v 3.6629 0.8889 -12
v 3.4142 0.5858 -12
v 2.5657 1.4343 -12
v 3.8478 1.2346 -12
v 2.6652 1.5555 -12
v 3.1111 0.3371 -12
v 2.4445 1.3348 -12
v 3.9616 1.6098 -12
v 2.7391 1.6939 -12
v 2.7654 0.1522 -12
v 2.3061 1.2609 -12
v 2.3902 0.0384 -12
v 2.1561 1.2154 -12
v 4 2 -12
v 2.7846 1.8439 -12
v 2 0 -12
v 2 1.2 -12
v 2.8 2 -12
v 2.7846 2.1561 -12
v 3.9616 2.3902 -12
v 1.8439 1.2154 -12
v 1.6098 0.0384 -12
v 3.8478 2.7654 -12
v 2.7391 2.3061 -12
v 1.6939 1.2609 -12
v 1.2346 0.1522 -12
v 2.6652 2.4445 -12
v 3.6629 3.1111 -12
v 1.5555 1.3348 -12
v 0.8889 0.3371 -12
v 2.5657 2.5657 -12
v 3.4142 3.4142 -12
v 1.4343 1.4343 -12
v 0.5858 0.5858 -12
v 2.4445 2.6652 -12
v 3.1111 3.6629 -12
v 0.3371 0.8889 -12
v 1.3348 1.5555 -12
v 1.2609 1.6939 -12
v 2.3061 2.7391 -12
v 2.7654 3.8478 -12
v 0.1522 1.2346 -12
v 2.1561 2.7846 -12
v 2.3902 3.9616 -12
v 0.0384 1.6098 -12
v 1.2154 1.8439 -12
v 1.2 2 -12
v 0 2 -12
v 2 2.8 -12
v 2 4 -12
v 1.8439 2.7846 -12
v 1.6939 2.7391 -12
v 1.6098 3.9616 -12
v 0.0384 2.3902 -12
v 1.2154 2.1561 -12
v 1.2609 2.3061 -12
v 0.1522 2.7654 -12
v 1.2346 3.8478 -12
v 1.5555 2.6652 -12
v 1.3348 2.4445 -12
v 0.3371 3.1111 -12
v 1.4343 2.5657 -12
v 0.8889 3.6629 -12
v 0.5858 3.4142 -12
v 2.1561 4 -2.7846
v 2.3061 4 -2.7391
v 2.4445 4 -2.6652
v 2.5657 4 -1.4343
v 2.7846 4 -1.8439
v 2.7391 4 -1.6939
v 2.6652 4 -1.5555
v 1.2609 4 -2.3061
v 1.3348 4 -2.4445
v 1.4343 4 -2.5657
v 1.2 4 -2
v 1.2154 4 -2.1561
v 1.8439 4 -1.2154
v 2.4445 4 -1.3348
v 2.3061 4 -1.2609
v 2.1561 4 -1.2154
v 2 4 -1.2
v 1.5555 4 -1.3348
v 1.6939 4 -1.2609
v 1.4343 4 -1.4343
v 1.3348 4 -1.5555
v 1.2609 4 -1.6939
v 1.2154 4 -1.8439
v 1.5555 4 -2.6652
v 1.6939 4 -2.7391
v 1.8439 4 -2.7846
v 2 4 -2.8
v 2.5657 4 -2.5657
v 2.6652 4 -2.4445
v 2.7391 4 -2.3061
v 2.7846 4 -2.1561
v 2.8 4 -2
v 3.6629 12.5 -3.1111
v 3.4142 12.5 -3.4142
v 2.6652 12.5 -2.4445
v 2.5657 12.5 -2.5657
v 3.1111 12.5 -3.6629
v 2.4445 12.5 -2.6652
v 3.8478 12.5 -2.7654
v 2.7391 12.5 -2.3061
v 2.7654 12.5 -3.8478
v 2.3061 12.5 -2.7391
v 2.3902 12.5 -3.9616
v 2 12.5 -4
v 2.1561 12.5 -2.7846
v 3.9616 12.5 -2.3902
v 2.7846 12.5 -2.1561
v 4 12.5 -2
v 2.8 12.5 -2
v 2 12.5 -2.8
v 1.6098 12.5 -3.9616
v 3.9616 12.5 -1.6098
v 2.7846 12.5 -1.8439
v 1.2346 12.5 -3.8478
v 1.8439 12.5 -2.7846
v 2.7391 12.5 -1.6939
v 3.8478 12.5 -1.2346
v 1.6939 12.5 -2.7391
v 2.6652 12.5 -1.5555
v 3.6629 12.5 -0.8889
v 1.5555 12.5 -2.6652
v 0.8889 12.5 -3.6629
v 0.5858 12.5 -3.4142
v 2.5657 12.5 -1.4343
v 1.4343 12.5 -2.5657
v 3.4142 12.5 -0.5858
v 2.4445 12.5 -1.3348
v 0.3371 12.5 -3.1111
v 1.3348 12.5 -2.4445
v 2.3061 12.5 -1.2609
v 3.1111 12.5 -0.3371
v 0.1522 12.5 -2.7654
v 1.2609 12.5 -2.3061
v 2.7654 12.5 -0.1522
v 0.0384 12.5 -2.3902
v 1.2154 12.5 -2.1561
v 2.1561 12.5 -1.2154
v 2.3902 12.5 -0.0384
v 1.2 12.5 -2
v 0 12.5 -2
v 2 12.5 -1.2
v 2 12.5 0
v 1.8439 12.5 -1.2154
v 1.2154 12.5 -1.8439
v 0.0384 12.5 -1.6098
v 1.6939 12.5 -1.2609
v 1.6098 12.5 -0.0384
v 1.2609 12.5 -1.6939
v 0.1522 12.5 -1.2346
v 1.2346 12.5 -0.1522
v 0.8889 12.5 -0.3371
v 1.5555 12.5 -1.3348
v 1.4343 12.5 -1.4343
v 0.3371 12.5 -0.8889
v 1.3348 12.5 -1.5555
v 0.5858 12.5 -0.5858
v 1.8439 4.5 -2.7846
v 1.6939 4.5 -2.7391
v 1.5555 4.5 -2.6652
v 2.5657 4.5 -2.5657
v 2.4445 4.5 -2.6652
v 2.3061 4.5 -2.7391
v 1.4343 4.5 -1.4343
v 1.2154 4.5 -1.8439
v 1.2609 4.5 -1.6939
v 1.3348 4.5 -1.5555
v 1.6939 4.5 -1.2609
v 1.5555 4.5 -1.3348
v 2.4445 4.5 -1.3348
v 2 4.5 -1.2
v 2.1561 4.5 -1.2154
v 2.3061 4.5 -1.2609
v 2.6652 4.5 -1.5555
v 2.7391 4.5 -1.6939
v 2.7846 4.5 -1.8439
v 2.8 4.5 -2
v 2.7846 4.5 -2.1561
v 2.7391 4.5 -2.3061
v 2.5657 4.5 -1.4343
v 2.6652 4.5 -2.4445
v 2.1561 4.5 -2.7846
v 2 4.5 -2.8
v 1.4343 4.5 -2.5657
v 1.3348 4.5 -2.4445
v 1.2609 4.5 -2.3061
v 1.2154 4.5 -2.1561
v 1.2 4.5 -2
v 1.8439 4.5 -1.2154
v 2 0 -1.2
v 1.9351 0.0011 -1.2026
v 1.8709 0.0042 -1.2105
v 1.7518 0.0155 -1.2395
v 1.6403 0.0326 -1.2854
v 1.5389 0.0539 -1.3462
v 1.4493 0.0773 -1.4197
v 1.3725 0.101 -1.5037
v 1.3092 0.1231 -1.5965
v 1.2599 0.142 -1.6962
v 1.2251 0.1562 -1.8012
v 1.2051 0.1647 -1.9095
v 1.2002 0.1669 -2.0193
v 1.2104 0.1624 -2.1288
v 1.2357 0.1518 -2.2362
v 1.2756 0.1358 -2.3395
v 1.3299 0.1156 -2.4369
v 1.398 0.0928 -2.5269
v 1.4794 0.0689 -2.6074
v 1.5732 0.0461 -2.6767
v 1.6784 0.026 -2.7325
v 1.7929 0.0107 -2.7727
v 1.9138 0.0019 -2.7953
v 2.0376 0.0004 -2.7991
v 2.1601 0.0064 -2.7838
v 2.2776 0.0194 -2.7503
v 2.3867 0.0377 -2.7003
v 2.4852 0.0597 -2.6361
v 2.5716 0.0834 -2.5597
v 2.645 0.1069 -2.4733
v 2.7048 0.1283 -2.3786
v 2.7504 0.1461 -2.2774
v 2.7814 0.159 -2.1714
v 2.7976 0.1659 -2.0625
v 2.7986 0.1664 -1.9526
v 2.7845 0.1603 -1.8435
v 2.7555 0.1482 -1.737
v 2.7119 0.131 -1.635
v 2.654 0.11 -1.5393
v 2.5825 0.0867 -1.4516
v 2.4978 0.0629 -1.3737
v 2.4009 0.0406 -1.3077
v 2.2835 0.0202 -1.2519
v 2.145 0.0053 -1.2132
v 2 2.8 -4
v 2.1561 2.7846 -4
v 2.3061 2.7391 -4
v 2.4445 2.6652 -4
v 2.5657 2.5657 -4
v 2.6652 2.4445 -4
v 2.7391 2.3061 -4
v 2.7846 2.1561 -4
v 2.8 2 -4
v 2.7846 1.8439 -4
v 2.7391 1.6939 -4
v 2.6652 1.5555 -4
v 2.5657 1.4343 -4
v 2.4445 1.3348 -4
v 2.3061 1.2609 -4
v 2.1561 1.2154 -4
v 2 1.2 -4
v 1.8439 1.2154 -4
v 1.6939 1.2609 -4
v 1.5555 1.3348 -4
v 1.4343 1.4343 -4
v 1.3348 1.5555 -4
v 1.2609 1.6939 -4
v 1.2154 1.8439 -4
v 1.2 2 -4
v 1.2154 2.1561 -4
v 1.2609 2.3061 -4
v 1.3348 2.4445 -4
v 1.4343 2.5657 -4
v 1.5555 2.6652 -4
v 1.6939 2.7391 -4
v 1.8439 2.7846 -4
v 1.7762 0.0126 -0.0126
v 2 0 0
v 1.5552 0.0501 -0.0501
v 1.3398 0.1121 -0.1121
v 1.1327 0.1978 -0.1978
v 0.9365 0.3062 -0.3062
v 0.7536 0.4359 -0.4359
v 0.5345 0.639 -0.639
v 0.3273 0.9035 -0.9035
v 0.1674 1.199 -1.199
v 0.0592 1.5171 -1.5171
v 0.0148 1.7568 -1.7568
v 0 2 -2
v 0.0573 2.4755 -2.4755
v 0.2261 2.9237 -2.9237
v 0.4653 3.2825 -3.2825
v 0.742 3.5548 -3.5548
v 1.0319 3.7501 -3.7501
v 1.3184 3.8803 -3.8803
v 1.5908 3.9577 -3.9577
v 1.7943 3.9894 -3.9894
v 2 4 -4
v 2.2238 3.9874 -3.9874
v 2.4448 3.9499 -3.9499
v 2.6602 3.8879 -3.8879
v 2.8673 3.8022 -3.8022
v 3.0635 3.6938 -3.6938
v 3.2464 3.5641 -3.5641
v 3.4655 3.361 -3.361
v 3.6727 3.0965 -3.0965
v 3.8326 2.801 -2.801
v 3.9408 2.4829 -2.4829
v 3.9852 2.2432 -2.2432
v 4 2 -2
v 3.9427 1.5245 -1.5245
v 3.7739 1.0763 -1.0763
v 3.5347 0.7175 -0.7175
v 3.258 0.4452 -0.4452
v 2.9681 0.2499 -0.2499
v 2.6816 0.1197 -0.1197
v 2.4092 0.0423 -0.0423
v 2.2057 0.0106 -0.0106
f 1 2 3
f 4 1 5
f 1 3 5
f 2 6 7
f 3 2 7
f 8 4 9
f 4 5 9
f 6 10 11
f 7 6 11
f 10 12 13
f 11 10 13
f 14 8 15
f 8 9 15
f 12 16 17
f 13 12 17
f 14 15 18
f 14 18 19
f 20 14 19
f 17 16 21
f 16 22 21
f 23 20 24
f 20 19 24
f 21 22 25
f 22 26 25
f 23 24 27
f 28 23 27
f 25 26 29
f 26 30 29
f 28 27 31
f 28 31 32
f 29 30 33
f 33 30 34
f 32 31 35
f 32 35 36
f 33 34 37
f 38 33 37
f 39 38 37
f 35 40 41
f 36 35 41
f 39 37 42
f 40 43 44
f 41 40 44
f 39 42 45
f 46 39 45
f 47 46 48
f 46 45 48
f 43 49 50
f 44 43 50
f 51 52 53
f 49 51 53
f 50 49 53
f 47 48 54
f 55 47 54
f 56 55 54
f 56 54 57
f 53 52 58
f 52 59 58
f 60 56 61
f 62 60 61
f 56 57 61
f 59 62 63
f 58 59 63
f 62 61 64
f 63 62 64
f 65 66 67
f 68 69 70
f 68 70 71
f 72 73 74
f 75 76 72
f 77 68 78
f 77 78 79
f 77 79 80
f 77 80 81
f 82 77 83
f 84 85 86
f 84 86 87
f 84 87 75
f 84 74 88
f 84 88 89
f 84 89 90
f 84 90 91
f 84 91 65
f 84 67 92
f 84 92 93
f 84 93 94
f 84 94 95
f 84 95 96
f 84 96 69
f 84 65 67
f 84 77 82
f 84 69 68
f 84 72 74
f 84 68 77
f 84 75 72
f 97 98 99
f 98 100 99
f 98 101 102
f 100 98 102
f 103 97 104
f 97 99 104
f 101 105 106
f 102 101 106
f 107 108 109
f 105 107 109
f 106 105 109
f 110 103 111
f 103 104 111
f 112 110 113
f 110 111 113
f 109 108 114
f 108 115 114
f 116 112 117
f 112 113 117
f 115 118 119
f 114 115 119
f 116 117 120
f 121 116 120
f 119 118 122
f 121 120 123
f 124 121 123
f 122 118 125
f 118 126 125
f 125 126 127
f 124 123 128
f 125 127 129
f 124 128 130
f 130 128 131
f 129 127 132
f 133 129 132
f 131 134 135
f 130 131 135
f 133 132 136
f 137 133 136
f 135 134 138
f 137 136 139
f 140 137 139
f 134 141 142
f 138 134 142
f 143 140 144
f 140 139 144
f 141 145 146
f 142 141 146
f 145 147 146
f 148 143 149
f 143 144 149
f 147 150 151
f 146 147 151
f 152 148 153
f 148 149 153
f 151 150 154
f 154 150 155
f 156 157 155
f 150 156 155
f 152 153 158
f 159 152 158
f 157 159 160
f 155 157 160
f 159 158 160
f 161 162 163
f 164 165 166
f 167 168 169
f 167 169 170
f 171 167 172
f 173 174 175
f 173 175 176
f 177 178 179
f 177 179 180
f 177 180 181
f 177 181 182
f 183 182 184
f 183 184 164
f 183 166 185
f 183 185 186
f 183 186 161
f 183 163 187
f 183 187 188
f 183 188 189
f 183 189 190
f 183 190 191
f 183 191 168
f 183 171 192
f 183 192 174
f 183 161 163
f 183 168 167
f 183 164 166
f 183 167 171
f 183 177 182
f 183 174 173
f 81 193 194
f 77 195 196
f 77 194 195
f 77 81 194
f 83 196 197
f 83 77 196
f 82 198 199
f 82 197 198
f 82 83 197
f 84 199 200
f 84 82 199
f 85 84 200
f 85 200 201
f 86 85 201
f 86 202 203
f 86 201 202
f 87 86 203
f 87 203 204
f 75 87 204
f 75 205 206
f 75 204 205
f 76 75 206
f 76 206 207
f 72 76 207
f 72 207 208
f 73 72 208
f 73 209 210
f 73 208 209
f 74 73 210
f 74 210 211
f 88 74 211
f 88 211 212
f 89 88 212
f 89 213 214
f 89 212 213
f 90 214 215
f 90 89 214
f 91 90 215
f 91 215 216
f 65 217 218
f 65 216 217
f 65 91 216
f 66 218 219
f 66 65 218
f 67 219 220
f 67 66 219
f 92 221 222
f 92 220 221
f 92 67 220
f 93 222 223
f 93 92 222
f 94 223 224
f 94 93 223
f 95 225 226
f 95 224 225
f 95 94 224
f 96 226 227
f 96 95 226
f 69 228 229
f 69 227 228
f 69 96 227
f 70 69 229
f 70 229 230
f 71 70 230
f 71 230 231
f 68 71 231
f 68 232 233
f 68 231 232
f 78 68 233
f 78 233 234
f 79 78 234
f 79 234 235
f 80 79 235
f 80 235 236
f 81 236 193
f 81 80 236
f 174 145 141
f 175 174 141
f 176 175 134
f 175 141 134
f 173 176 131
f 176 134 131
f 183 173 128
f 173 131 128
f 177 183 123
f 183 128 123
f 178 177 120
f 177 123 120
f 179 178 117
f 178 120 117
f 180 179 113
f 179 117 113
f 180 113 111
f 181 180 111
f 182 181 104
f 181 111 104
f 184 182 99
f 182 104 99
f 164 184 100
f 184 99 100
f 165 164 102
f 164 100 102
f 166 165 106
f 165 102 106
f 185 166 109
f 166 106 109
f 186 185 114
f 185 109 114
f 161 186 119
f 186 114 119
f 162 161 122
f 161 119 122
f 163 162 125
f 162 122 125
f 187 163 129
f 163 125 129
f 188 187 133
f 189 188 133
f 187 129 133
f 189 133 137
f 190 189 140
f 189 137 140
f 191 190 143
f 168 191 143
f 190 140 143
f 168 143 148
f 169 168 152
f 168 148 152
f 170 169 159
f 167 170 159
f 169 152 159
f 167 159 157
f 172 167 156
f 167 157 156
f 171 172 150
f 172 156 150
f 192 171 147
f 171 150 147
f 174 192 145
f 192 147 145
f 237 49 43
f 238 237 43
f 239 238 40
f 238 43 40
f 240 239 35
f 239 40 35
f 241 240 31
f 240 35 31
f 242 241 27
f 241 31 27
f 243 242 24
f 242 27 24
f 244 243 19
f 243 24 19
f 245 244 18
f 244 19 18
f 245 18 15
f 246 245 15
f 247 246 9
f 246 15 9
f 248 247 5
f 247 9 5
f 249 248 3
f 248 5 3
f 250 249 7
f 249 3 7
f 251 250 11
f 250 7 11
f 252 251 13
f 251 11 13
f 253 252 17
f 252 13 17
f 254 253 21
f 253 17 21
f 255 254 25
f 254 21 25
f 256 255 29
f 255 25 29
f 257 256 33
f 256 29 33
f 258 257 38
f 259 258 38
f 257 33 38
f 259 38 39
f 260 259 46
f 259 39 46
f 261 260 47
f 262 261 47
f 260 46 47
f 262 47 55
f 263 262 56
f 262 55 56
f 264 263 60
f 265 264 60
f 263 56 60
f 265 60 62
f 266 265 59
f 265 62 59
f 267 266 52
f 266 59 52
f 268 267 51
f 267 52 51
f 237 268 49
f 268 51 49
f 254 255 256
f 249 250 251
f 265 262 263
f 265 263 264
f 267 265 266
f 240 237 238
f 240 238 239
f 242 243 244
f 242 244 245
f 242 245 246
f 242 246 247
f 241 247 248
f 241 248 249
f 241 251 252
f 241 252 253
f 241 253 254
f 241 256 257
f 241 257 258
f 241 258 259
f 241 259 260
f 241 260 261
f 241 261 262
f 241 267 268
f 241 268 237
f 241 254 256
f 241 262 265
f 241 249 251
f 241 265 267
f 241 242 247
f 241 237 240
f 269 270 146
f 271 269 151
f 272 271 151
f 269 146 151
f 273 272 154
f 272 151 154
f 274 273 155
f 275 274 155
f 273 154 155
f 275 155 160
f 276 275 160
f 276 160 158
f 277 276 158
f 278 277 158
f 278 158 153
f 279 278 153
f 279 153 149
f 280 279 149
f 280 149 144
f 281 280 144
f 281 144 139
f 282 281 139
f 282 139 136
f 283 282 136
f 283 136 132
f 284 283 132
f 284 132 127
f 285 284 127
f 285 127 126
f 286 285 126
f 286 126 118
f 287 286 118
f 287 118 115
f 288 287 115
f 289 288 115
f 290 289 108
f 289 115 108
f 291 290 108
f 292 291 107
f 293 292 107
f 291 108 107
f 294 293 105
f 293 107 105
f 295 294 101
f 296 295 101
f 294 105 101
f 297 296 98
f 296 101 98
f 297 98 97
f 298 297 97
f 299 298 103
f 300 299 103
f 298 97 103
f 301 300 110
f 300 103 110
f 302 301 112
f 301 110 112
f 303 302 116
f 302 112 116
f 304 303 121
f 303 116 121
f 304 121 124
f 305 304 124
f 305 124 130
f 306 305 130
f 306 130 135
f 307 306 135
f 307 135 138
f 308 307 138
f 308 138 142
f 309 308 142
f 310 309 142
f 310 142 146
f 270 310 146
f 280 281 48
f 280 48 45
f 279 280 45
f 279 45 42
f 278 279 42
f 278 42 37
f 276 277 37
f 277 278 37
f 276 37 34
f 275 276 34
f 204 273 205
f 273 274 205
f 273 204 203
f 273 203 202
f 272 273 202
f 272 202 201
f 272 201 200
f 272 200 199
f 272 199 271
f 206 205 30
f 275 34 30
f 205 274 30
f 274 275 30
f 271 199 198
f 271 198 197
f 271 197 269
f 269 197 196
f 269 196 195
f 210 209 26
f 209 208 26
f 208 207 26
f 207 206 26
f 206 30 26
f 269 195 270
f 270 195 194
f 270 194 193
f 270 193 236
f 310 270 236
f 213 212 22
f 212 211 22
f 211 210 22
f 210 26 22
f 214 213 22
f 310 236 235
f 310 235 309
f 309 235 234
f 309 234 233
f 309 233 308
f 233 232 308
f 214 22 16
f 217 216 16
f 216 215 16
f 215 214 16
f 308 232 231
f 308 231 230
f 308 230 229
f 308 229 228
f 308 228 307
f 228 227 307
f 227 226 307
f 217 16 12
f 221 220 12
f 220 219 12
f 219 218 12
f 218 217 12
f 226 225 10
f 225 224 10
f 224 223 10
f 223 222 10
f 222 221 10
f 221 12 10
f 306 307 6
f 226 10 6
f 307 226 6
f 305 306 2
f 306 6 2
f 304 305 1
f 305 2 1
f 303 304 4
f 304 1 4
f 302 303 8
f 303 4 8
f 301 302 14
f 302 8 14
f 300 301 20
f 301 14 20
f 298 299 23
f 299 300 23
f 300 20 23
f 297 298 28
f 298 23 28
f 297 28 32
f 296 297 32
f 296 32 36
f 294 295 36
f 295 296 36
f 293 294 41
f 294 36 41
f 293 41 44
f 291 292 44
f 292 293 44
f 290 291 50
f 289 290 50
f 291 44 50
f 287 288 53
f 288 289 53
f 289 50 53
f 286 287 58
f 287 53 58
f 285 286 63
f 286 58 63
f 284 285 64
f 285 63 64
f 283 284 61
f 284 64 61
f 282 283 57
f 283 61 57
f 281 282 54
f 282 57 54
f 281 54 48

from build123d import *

# Parameters (mm, degrees)
ESQUISSE4_W             = 8
ESQUISSE4_H             = 4
BOSS_EXTRU_2_DEPTH      = 4
ESQUISSE10_R            = 0.8
ENL_V_MAT_EXTRU_3_DEPTH = 8
ENL_V_START             = -4
ESQUISSE11_R            = 0.8
ENL_V_MAT_EXTRU_4_DEPTH = 4
ESQUISSE7_R             = 0.8
ENL_V_MAT_EXTRU_2_DEPTH = 8
CONG_4_R                = 2


with BuildPart() as part:
    # Esquisse4 → Boss.-Extru.2 (new body)
    with BuildSketch(Plane(origin=(0, 0, 0), x_dir=(0, 0, -1), z_dir=(1, 0, 0))):
        with Locations((8, 2)):
            Rectangle(ESQUISSE4_W, ESQUISSE4_H)
        Polygon((4, 0), (4, 4), (4, 12.5), (0, 12.5), (0, 0), align=None)
    extrude(amount=BOSS_EXTRU_2_DEPTH)

    # Esquisse10 → Enlèv. mat.-Extru.3 (cut)
    with BuildSketch(Plane(origin=(0, 12.5, 0), x_dir=(1, 0, 0), z_dir=(0, 1, 0))):
        with Locations(Location((2, 2, 0), (0, 0, 270))):
            Circle(ESQUISSE10_R)
    extrude(amount=-ENL_V_MAT_EXTRU_3_DEPTH, mode=Mode.SUBTRACT)

    # Esquisse11 → Enlèv. mat.-Extru.4 (cut)
    with BuildSketch(Plane.XZ.offset(ENL_V_START)):
        with Locations(Location((2, -2, 0), (0, 0, 90))):
            Circle(ESQUISSE11_R)
    extrude(amount=ENL_V_MAT_EXTRU_4_DEPTH, mode=Mode.SUBTRACT)

    # Esquisse7 → Enlèv. mat.-Extru.2 (cut)
    with BuildSketch(Plane(origin=(0, 0, -12), x_dir=(1, 0, 0), z_dir=(0, 0, -1))):
        with Locations(Location((2, -2, 0), (0, 0, 270))):
            Circle(ESQUISSE7_R)
    extrude(amount=-ENL_V_MAT_EXTRU_2_DEPTH, mode=Mode.SUBTRACT)

    # Congé4
    # the kernel refuses this fillet: 2 mm, written as the material it takes off along each edge
    with BuildSketch(Plane(origin=(4, 0, -17), x_dir=(-1, 0, 0), z_dir=(0, 0, 1)), Plane(origin=(0, 0, 5), x_dir=(1, 0, 0), z_dir=(0, 0, -1))) as cong_4_piece_1:
        with BuildLine():
            CenterArc((CONG_4_R, -CONG_4_R), CONG_4_R, 90, 90)
            Line((0, -CONG_4_R), (0, 0))
            Line((0, 0), (CONG_4_R, 0))
        make_face()
    extrude(amount=22, mode=Mode.SUBTRACT)
    with BuildSketch(Plane(origin=(4, 17.5, -4), x_dir=(0, 0, 1), z_dir=(0, -1, 0)), Plane(origin=(0, 4, -4), x_dir=(0, 0, 1), z_dir=(0, 1, 0))) as cong_4_piece_2:
        with BuildLine():
            CenterArc((CONG_4_R, CONG_4_R), CONG_4_R, 180, 90)
            Line((0, CONG_4_R), (0, 0))
            Line((0, 0), (CONG_4_R, 0))
        make_face()
    extrude(amount=13.5, mode=Mode.SUBTRACT)
    with BuildSketch(Plane(origin=(4, 4, -17), x_dir=(0, -1, 0), z_dir=(0, 0, 1))) as cong_4_piece_3:
        with BuildLine():
            CenterArc((CONG_4_R, -CONG_4_R), CONG_4_R, 90, 90)
            Line((0, -CONG_4_R), (0, 0))
            Line((0, 0), (CONG_4_R, 0))
        make_face()
    extrude(amount=13, mode=Mode.SUBTRACT)
    with BuildSketch(Plane(origin=(0, 4, -17), x_dir=(0, -1, 0), z_dir=(0, 0, 1))) as cong_4_piece_4:
        with BuildLine():
            CenterArc((CONG_4_R, CONG_4_R), CONG_4_R, 180, 90)
            Line((0, CONG_4_R), (0, 0))
            Line((0, 0), (CONG_4_R, 0))
        make_face()
    extrude(amount=13, mode=Mode.SUBTRACT)
    with BuildSketch(Plane(origin=(4, 17.5, 0), x_dir=(0, 0, -1), z_dir=(0, -1, 0))) as cong_4_piece_5:
        with BuildLine():
            CenterArc((CONG_4_R, -CONG_4_R), CONG_4_R, 90, 90)
            Line((0, -CONG_4_R), (0, 0))
            Line((0, 0), (CONG_4_R, 0))
        make_face()
    extrude(amount=22.5, mode=Mode.SUBTRACT)
    with BuildSketch(Plane(origin=(0, 17.5, 0), x_dir=(0, 0, -1), z_dir=(0, -1, 0))) as cong_4_piece_6:
        with BuildLine():
            CenterArc((CONG_4_R, CONG_4_R), CONG_4_R, 180, 90)
            Line((0, CONG_4_R), (0, 0))
            Line((0, 0), (CONG_4_R, 0))
        make_face()
    extrude(amount=22.5, mode=Mode.SUBTRACT)
    with BuildSketch(Plane(origin=(4, 4, -12), x_dir=(0, -1, 0), z_dir=(0, 0, 1))) as cong_4_piece_7a_section:
        with BuildLine():
            CenterArc((CONG_4_R, -CONG_4_R), CONG_4_R, 90, 90)
            Line((0, -CONG_4_R), (0, 0))
            Line((0, 0), (CONG_4_R, 0))
        make_face()
    cong_4_piece_7a = extrude(amount=13, mode=Mode.PRIVATE)
    cong_4_piece_7a = split(cong_4_piece_7a, bisect_by=Plane(origin=(4, 4, 0), z_dir=(0, 0, -1)), keep=Keep.TOP, mode=Mode.PRIVATE)
    cong_4_piece_7a = cong_4_piece_7a - Plane(origin=(2, 4, -2), x_dir=(0, 0, 1), z_dir=(0, 1, 0)) * Cylinder(0.8, 35, mode=Mode.PRIVATE)
    cong_4_piece_7a = split(cong_4_piece_7a, bisect_by=Plane(origin=(4, 4, -4), z_dir=(0, 0, 1)), keep=Keep.TOP, mode=Mode.PRIVATE)
    with BuildSketch(Plane(origin=(4, 12.5, -4), x_dir=(0, 0, 1), z_dir=(0, -1, 0))) as cong_4_piece_7b_section:
        with BuildLine():
            CenterArc((CONG_4_R, CONG_4_R), CONG_4_R, 180, 90)
            Line((0, CONG_4_R), (0, 0))
            Line((0, 0), (CONG_4_R, 0))
        make_face()
    cong_4_piece_7b = extrude(amount=13.5, mode=Mode.PRIVATE)
    cong_4_piece_7b = split(cong_4_piece_7b, bisect_by=Plane(origin=(4, 0, -4), z_dir=(0, 1, 0)), keep=Keep.TOP, mode=Mode.PRIVATE)
    cong_4_piece_7b = split(cong_4_piece_7b, bisect_by=Plane(origin=(4, 4, -4), z_dir=(0, -1, 0)), keep=Keep.TOP, mode=Mode.PRIVATE)
    cong_4_piece_7b = cong_4_piece_7b - Plane(origin=(2, 2, -4), x_dir=(0, 1, 0), z_dir=(0, 0, -1)) * Cylinder(0.8, 35, mode=Mode.PRIVATE)
    cong_4_piece_7 = cong_4_piece_7a & cong_4_piece_7b
    add(cong_4_piece_7, mode=Mode.SUBTRACT)
    with BuildSketch(Plane(origin=(0, 4, -12), x_dir=(0, -1, 0), z_dir=(0, 0, 1))) as cong_4_piece_8a_section:
        with BuildLine():
            CenterArc((CONG_4_R, CONG_4_R), CONG_4_R, 180, 90)
            Line((0, CONG_4_R), (0, 0))
            Line((0, 0), (CONG_4_R, 0))
        make_face()
    cong_4_piece_8a = extrude(amount=13, mode=Mode.PRIVATE)
    cong_4_piece_8a = split(cong_4_piece_8a, bisect_by=Plane(origin=(0, 4, 0), z_dir=(0, 0, -1)), keep=Keep.TOP, mode=Mode.PRIVATE)
    cong_4_piece_8a = cong_4_piece_8a - Plane(origin=(2, 4, -2), x_dir=(0, 0, 1), z_dir=(0, 1, 0)) * Cylinder(0.8, 35, mode=Mode.PRIVATE)
    cong_4_piece_8a = split(cong_4_piece_8a, bisect_by=Plane(origin=(0, 4, -4), z_dir=(0, 0, 1)), keep=Keep.TOP, mode=Mode.PRIVATE)
    with BuildSketch(Plane(origin=(0, -1, -4), x_dir=(0, 0, 1), z_dir=(0, 1, 0))) as cong_4_piece_8b_section:
        with BuildLine():
            CenterArc((CONG_4_R, CONG_4_R), CONG_4_R, 180, 90)
            Line((0, CONG_4_R), (0, 0))
            Line((0, 0), (CONG_4_R, 0))
        make_face()
    cong_4_piece_8b = extrude(amount=13.5, mode=Mode.PRIVATE)
    cong_4_piece_8b = split(cong_4_piece_8b, bisect_by=Plane(origin=(0, 0, -4), z_dir=(0, 1, 0)), keep=Keep.TOP, mode=Mode.PRIVATE)
    cong_4_piece_8b = split(cong_4_piece_8b, bisect_by=Plane(origin=(0, 4, -4), z_dir=(0, -1, 0)), keep=Keep.TOP, mode=Mode.PRIVATE)
    cong_4_piece_8b = cong_4_piece_8b - Plane(origin=(2, 2, -4), x_dir=(0, 1, 0), z_dir=(0, 0, -1)) * Cylinder(0.8, 35, mode=Mode.PRIVATE)
    cong_4_piece_8 = cong_4_piece_8a & cong_4_piece_8b
    add(cong_4_piece_8, mode=Mode.SUBTRACT)


solid = part.part
